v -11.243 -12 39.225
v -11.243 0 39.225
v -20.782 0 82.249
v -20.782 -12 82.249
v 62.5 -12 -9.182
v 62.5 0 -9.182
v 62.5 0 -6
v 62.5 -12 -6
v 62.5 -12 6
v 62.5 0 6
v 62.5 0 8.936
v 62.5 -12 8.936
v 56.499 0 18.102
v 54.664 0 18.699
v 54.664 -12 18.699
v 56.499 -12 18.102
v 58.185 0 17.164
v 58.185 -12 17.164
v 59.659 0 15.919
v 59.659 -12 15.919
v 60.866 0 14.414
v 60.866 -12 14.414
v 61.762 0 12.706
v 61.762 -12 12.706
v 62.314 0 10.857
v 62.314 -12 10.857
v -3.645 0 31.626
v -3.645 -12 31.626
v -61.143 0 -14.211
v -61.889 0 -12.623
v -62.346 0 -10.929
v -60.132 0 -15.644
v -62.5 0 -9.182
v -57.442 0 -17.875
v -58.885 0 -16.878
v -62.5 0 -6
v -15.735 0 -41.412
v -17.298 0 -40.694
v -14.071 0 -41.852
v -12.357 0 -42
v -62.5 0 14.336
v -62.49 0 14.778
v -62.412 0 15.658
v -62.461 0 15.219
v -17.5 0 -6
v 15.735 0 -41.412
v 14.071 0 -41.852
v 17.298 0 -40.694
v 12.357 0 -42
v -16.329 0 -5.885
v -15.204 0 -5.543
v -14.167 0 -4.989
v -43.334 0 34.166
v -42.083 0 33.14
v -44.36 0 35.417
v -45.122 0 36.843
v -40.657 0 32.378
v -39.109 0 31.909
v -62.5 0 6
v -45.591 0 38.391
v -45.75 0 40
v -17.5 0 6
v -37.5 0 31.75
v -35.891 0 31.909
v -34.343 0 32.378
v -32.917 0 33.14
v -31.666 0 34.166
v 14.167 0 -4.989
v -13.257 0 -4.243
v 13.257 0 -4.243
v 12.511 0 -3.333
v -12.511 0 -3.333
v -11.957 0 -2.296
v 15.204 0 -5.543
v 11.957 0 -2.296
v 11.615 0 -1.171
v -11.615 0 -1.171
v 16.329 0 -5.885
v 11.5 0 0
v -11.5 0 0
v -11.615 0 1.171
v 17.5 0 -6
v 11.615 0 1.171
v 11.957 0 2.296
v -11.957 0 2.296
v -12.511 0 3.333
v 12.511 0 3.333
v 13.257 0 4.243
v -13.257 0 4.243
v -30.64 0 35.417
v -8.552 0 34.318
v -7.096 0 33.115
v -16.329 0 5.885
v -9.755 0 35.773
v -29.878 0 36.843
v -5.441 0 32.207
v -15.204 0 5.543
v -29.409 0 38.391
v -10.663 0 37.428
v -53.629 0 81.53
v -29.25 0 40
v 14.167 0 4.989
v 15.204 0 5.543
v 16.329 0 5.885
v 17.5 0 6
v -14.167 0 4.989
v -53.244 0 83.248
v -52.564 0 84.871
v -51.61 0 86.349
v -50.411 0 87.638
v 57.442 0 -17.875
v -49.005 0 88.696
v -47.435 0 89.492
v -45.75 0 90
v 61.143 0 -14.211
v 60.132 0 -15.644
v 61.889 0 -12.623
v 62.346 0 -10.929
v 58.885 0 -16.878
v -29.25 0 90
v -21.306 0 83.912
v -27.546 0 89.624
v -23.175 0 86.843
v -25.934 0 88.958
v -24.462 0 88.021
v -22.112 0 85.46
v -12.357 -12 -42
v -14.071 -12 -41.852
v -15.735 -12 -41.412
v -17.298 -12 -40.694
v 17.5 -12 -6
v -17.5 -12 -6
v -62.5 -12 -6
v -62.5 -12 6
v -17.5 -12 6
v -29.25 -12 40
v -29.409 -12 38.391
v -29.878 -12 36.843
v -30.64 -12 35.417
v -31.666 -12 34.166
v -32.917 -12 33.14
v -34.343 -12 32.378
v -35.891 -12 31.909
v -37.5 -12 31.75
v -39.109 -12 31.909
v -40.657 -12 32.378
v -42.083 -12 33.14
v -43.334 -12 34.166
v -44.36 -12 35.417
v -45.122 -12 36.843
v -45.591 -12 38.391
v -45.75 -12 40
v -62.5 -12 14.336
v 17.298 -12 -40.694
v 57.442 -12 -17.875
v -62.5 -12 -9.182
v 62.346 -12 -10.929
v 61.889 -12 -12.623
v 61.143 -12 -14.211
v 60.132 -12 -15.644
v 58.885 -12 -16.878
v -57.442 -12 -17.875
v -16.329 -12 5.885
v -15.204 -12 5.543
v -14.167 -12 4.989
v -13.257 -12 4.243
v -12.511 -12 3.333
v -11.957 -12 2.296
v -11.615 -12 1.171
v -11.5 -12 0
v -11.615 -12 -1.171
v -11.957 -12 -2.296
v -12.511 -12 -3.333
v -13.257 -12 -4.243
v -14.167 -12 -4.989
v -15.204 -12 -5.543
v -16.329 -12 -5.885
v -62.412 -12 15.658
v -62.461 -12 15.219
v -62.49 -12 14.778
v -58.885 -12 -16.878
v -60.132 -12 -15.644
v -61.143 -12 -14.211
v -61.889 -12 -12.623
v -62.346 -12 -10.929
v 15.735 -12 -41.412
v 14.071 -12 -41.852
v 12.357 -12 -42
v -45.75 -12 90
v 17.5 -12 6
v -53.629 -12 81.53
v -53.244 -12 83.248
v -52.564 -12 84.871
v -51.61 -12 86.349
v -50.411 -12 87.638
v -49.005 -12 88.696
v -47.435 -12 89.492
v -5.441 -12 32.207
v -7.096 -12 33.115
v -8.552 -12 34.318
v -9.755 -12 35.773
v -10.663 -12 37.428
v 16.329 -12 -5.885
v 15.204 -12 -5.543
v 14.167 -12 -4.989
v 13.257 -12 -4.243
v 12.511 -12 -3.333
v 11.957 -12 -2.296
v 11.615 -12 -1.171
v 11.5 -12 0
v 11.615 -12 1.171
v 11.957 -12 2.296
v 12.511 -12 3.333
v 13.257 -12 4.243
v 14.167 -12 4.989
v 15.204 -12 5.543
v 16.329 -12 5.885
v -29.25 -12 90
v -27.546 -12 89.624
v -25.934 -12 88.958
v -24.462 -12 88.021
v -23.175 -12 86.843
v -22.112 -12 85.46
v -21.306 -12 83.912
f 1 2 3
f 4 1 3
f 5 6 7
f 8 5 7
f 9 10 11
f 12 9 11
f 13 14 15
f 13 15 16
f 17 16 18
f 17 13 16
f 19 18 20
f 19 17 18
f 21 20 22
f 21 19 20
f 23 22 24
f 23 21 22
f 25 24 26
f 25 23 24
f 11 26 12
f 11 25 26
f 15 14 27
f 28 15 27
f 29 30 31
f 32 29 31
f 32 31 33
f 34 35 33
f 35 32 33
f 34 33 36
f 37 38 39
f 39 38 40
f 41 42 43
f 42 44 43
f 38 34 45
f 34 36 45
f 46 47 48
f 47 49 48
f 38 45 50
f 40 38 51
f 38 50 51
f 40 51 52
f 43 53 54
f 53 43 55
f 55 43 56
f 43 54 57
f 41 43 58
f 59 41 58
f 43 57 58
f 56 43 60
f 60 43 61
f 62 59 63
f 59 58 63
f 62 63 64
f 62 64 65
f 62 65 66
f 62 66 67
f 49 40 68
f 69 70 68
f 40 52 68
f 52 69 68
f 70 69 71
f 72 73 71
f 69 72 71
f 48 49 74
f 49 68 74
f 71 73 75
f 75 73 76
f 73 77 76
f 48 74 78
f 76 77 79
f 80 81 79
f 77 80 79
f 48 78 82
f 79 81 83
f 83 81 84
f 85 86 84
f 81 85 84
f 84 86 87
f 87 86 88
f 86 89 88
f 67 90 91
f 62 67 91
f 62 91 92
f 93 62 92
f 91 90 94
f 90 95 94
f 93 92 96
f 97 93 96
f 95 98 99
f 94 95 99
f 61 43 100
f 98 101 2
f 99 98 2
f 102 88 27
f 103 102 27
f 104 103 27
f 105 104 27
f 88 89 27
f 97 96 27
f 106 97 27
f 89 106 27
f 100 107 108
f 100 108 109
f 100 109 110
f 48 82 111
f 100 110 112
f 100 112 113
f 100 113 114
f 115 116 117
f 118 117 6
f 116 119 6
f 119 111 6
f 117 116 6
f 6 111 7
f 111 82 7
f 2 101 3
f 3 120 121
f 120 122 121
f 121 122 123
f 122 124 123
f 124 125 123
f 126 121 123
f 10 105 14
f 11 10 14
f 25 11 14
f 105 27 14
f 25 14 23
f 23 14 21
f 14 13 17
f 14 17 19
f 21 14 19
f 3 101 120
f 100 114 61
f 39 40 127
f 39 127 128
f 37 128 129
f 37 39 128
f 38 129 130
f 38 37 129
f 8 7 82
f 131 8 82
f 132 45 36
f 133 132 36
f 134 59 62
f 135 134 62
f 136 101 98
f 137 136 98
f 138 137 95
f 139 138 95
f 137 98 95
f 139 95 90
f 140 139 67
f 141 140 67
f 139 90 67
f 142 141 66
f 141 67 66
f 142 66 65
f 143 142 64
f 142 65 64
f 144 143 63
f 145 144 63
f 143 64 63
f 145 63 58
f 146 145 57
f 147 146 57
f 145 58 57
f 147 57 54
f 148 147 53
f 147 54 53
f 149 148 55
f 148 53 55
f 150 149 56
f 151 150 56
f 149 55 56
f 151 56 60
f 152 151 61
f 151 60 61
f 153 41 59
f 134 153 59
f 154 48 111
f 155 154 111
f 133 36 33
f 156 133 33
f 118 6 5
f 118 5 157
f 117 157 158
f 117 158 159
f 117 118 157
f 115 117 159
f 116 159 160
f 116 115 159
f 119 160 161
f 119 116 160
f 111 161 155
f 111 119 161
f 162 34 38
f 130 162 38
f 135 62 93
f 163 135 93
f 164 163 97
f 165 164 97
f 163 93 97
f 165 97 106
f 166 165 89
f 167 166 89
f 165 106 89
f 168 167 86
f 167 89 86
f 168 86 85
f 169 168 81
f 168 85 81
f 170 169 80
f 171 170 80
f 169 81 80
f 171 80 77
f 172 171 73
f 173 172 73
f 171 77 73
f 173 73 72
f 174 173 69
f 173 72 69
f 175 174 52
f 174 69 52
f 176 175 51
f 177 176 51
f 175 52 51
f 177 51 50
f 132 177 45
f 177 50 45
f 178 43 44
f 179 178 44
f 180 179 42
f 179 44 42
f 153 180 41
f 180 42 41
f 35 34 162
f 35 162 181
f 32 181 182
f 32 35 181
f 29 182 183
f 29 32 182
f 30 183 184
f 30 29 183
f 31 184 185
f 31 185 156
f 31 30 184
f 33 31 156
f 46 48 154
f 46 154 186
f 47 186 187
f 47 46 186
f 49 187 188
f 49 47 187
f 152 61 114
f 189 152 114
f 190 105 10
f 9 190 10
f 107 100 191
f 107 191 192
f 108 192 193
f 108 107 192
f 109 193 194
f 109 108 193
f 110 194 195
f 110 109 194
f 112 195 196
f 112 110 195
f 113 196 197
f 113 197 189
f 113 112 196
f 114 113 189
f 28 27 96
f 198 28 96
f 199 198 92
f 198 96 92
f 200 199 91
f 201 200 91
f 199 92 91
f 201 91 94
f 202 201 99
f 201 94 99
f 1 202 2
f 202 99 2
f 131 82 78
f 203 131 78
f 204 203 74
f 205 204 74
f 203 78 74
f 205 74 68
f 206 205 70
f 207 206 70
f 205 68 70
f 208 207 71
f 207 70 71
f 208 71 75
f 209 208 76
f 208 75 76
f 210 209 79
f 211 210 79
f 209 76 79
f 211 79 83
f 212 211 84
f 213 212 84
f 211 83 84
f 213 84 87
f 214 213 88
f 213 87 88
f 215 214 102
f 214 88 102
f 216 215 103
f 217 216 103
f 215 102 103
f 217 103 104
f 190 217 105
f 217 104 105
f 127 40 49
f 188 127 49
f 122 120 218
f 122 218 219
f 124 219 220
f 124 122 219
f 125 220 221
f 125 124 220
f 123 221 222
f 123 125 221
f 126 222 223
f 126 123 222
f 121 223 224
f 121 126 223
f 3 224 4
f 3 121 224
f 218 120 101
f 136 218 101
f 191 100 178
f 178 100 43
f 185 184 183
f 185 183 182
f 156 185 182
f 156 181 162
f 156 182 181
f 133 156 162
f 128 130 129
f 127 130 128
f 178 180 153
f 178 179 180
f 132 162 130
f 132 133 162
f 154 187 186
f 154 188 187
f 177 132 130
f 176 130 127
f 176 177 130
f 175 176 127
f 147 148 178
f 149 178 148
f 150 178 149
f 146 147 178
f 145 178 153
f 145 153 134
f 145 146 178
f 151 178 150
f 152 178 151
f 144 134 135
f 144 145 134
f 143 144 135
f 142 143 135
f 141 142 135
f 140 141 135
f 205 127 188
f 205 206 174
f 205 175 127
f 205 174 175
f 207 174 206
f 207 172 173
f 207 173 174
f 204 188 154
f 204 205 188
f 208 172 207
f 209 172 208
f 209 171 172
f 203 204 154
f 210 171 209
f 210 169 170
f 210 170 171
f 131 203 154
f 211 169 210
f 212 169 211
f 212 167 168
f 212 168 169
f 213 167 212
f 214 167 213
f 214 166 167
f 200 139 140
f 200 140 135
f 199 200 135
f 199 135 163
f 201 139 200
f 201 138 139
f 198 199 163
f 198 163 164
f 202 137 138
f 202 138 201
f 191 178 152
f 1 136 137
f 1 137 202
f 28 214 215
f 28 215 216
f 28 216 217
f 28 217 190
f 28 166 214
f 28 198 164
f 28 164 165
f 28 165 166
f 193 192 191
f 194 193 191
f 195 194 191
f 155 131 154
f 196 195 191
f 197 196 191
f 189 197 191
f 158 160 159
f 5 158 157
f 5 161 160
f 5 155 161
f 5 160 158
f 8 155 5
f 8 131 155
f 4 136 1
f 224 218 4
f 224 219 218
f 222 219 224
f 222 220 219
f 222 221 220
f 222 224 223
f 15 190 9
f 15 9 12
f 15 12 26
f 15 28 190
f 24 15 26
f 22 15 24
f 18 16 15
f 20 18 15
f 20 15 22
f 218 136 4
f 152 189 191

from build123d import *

# Parameters (mm, degrees)
F1_DEPTH     = 12
F2_T1_DEPTH  = 12
F2_T3_DEPTH  = 54.7223945877
F2_T5_DEPTH  = 15.3186487605
F2_T7_DEPTH  = 41.0920435526
F2_T9_DEPTH  = 25.2174840277
F2_T11_DEPTH = 25.2174840277
F2_T13_DEPTH = 41.0920435526
F2_T15_DEPTH = 52.1292425836
F2_T17_DEPTH = 51.6983242764


# Not quite as in the source:
# - a fillet or chamfer that OpenCascade refuses, or shapes differently, is made with other operations: its cross-section is extruded or revolved along the edge and cut away or added


with BuildPart() as f1:
    # F0 (on Front) → F1 (new body)
    with BuildSketch(Plane.XZ):
        with BuildLine():
            Line((-52.5, 90), (-62.5, 15))
            Line((-62.5, 15), (-62.5, 6))
            Line((-62.5, 6), (-17.5, 6))
            ThreePointArc((-17.5, 6), (-11.5, 0), (-17.5, -6))
            Line((-17.5, -6), (-62.5, -6))
            Line((-62.5, -6), (-62.5, -15))
            Line((-62.5, -15), (-15, -42))
            Line((-15, -42), (15, -42))
            Line((15, -42), (62.5, -15))
            Line((62.5, -15), (62.5, -6))
            Line((62.5, -6), (17.5, -6))
            ThreePointArc((17.5, -6), (11.5, 0), (17.5, 6))
            Line((17.5, 6), (62.5, 6))
            Line((62.5, 6), (62.5, 16.9622953511))
            Line((62.5, 16.9622953511), (-9.86454105, 33.0051278665))
            Line((-9.86454105, 33.0051278665), (-22.5, 90))
            Line((-22.5, 90), (-29.25, 90))
            Line((-29.25, 90), (-29.25, 40))
            ThreePointArc((-29.25, 40), (-37.5, 31.75), (-45.75, 40))
            Line((-45.75, 40), (-45.75, 90))
            Line((-45.75, 90), (-52.5, 90))
        make_face()
    extrude(amount=F1_DEPTH)

    # F2: fillet of radius 10 on 9 edges, made by hand

    # F2_s2 → F2_t1 (join)
    with BuildSketch(Plane.XZ):
        with BuildLine():
            ThreePointArc((-3.6448495312, 31.6262554535), (-8.5515212037, 34.3181477128), (-11.243413463, 39.2248193853))
            Line((-11.243413463, 39.2248193853), (-9.86454105, 33.0051278665))
            Line((-9.86454105, 33.0051278665), (-3.6448495312, 31.6262554535))
        make_face()
    extrude(amount=F2_T1_DEPTH)

    # F2_s4 → F2_t3 (cut)
    with BuildSketch(Plane.XZ.offset(-21.3611972939)):
        with BuildLine():
            ThreePointArc((-53.62927012, 81.5304741001), (-51.0385819893, 87.0201735553), (-45.75, 90))
            Line((-45.75, 90), (-52.5, 90))
            Line((-52.5, 90), (-53.62927012, 81.5304741001))
        make_face()
    extrude(amount=F2_T3_DEPTH, mode=Mode.SUBTRACT)

    # F2_s6 → F2_t5 (cut)
    with BuildSketch(Plane.XZ.offset(-1.6593243803)):
        with BuildLine():
            ThreePointArc((-62.4122790068, 15.6579074488), (-62.478045652, 14.9985428246), (-62.5, 14.3362702479))
            Line((-62.5, 14.3362702479), (-62.5, 15))
            Line((-62.5, 15), (-62.4122790068, 15.6579074488))
        make_face()
    extrude(amount=F2_T5_DEPTH, mode=Mode.SUBTRACT)

    # F2_s8 → F2_t7 (cut)
    with BuildSketch(Plane.XZ.offset(-14.5460217763)):
        with BuildLine():
            ThreePointArc((-57.4416662495, -17.875263395), (-61.1433981308, -14.2106735867), (-62.5, -9.1815912895))
            Line((-62.5, -9.1815912895), (-62.5, -15))
            Line((-62.5, -15), (-57.4416662495, -17.875263395))
        make_face()
    extrude(amount=F2_T7_DEPTH, mode=Mode.SUBTRACT)

    # F2_s10 → F2_t9 (cut)
    with BuildSketch(Plane.XZ.offset(-6.6087420138)):
        with BuildLine():
            ThreePointArc((-12.3565031945, -42), (-14.9122104297, -41.6679036263), (-17.2981694439, -40.6936721056))
            Line((-17.2981694439, -40.6936721056), (-15, -42))
            Line((-15, -42), (-12.3565031945, -42))
        make_face()
    extrude(amount=F2_T9_DEPTH, mode=Mode.SUBTRACT)

    # F2_s12 → F2_t11 (cut)
    with BuildSketch(Plane.XZ.offset(-6.6087420138)):
        with BuildLine():
            ThreePointArc((17.2981694439, -40.6936721056), (14.9122104297, -41.6679036263), (12.3565031945, -42))
            Line((12.3565031945, -42), (15, -42))
            Line((15, -42), (17.2981694439, -40.6936721056))
        make_face()
    extrude(amount=F2_T11_DEPTH, mode=Mode.SUBTRACT)

    # F2_s14 → F2_t13 (cut)
    with BuildSketch(Plane.XZ.offset(-14.5460217763)):
        with BuildLine():
            ThreePointArc((62.5, -9.1815912895), (61.1433981308, -14.2106735867), (57.4416662495, -17.875263395))
            Line((57.4416662495, -17.875263395), (62.5, -15))
            Line((62.5, -15), (62.5, -9.1815912895))
        make_face()
    extrude(amount=F2_T13_DEPTH, mode=Mode.SUBTRACT)

    # F2_s16 → F2_t15 (cut)
    with BuildSketch(Plane.XZ.offset(-20.0646212918)):
        with BuildLine():
            ThreePointArc((54.6643961394, 18.6994069056), (60.2988448309, 15.1956815563), (62.5, 8.9364468344))
            Line((62.5, 8.9364468344), (62.5, 16.9622953511))
            Line((62.5, 16.9622953511), (54.6643961394, 18.6994069056))
        make_face()
    extrude(amount=F2_T15_DEPTH, mode=Mode.SUBTRACT)

    # F2_s18 → F2_t17 (cut)
    with BuildSketch(Plane.XZ.offset(-19.8491621382)):
        with BuildLine():
            ThreePointArc((-29.25, 90), (-23.7926014307, 87.4605787727), (-20.7815420039, 82.2485369039))
            Line((-20.7815420039, 82.2485369039), (-22.5, 90))
            Line((-22.5, 90), (-29.25, 90))
        make_face()
    extrude(amount=F2_T17_DEPTH, mode=Mode.SUBTRACT)


solid = f1.part
